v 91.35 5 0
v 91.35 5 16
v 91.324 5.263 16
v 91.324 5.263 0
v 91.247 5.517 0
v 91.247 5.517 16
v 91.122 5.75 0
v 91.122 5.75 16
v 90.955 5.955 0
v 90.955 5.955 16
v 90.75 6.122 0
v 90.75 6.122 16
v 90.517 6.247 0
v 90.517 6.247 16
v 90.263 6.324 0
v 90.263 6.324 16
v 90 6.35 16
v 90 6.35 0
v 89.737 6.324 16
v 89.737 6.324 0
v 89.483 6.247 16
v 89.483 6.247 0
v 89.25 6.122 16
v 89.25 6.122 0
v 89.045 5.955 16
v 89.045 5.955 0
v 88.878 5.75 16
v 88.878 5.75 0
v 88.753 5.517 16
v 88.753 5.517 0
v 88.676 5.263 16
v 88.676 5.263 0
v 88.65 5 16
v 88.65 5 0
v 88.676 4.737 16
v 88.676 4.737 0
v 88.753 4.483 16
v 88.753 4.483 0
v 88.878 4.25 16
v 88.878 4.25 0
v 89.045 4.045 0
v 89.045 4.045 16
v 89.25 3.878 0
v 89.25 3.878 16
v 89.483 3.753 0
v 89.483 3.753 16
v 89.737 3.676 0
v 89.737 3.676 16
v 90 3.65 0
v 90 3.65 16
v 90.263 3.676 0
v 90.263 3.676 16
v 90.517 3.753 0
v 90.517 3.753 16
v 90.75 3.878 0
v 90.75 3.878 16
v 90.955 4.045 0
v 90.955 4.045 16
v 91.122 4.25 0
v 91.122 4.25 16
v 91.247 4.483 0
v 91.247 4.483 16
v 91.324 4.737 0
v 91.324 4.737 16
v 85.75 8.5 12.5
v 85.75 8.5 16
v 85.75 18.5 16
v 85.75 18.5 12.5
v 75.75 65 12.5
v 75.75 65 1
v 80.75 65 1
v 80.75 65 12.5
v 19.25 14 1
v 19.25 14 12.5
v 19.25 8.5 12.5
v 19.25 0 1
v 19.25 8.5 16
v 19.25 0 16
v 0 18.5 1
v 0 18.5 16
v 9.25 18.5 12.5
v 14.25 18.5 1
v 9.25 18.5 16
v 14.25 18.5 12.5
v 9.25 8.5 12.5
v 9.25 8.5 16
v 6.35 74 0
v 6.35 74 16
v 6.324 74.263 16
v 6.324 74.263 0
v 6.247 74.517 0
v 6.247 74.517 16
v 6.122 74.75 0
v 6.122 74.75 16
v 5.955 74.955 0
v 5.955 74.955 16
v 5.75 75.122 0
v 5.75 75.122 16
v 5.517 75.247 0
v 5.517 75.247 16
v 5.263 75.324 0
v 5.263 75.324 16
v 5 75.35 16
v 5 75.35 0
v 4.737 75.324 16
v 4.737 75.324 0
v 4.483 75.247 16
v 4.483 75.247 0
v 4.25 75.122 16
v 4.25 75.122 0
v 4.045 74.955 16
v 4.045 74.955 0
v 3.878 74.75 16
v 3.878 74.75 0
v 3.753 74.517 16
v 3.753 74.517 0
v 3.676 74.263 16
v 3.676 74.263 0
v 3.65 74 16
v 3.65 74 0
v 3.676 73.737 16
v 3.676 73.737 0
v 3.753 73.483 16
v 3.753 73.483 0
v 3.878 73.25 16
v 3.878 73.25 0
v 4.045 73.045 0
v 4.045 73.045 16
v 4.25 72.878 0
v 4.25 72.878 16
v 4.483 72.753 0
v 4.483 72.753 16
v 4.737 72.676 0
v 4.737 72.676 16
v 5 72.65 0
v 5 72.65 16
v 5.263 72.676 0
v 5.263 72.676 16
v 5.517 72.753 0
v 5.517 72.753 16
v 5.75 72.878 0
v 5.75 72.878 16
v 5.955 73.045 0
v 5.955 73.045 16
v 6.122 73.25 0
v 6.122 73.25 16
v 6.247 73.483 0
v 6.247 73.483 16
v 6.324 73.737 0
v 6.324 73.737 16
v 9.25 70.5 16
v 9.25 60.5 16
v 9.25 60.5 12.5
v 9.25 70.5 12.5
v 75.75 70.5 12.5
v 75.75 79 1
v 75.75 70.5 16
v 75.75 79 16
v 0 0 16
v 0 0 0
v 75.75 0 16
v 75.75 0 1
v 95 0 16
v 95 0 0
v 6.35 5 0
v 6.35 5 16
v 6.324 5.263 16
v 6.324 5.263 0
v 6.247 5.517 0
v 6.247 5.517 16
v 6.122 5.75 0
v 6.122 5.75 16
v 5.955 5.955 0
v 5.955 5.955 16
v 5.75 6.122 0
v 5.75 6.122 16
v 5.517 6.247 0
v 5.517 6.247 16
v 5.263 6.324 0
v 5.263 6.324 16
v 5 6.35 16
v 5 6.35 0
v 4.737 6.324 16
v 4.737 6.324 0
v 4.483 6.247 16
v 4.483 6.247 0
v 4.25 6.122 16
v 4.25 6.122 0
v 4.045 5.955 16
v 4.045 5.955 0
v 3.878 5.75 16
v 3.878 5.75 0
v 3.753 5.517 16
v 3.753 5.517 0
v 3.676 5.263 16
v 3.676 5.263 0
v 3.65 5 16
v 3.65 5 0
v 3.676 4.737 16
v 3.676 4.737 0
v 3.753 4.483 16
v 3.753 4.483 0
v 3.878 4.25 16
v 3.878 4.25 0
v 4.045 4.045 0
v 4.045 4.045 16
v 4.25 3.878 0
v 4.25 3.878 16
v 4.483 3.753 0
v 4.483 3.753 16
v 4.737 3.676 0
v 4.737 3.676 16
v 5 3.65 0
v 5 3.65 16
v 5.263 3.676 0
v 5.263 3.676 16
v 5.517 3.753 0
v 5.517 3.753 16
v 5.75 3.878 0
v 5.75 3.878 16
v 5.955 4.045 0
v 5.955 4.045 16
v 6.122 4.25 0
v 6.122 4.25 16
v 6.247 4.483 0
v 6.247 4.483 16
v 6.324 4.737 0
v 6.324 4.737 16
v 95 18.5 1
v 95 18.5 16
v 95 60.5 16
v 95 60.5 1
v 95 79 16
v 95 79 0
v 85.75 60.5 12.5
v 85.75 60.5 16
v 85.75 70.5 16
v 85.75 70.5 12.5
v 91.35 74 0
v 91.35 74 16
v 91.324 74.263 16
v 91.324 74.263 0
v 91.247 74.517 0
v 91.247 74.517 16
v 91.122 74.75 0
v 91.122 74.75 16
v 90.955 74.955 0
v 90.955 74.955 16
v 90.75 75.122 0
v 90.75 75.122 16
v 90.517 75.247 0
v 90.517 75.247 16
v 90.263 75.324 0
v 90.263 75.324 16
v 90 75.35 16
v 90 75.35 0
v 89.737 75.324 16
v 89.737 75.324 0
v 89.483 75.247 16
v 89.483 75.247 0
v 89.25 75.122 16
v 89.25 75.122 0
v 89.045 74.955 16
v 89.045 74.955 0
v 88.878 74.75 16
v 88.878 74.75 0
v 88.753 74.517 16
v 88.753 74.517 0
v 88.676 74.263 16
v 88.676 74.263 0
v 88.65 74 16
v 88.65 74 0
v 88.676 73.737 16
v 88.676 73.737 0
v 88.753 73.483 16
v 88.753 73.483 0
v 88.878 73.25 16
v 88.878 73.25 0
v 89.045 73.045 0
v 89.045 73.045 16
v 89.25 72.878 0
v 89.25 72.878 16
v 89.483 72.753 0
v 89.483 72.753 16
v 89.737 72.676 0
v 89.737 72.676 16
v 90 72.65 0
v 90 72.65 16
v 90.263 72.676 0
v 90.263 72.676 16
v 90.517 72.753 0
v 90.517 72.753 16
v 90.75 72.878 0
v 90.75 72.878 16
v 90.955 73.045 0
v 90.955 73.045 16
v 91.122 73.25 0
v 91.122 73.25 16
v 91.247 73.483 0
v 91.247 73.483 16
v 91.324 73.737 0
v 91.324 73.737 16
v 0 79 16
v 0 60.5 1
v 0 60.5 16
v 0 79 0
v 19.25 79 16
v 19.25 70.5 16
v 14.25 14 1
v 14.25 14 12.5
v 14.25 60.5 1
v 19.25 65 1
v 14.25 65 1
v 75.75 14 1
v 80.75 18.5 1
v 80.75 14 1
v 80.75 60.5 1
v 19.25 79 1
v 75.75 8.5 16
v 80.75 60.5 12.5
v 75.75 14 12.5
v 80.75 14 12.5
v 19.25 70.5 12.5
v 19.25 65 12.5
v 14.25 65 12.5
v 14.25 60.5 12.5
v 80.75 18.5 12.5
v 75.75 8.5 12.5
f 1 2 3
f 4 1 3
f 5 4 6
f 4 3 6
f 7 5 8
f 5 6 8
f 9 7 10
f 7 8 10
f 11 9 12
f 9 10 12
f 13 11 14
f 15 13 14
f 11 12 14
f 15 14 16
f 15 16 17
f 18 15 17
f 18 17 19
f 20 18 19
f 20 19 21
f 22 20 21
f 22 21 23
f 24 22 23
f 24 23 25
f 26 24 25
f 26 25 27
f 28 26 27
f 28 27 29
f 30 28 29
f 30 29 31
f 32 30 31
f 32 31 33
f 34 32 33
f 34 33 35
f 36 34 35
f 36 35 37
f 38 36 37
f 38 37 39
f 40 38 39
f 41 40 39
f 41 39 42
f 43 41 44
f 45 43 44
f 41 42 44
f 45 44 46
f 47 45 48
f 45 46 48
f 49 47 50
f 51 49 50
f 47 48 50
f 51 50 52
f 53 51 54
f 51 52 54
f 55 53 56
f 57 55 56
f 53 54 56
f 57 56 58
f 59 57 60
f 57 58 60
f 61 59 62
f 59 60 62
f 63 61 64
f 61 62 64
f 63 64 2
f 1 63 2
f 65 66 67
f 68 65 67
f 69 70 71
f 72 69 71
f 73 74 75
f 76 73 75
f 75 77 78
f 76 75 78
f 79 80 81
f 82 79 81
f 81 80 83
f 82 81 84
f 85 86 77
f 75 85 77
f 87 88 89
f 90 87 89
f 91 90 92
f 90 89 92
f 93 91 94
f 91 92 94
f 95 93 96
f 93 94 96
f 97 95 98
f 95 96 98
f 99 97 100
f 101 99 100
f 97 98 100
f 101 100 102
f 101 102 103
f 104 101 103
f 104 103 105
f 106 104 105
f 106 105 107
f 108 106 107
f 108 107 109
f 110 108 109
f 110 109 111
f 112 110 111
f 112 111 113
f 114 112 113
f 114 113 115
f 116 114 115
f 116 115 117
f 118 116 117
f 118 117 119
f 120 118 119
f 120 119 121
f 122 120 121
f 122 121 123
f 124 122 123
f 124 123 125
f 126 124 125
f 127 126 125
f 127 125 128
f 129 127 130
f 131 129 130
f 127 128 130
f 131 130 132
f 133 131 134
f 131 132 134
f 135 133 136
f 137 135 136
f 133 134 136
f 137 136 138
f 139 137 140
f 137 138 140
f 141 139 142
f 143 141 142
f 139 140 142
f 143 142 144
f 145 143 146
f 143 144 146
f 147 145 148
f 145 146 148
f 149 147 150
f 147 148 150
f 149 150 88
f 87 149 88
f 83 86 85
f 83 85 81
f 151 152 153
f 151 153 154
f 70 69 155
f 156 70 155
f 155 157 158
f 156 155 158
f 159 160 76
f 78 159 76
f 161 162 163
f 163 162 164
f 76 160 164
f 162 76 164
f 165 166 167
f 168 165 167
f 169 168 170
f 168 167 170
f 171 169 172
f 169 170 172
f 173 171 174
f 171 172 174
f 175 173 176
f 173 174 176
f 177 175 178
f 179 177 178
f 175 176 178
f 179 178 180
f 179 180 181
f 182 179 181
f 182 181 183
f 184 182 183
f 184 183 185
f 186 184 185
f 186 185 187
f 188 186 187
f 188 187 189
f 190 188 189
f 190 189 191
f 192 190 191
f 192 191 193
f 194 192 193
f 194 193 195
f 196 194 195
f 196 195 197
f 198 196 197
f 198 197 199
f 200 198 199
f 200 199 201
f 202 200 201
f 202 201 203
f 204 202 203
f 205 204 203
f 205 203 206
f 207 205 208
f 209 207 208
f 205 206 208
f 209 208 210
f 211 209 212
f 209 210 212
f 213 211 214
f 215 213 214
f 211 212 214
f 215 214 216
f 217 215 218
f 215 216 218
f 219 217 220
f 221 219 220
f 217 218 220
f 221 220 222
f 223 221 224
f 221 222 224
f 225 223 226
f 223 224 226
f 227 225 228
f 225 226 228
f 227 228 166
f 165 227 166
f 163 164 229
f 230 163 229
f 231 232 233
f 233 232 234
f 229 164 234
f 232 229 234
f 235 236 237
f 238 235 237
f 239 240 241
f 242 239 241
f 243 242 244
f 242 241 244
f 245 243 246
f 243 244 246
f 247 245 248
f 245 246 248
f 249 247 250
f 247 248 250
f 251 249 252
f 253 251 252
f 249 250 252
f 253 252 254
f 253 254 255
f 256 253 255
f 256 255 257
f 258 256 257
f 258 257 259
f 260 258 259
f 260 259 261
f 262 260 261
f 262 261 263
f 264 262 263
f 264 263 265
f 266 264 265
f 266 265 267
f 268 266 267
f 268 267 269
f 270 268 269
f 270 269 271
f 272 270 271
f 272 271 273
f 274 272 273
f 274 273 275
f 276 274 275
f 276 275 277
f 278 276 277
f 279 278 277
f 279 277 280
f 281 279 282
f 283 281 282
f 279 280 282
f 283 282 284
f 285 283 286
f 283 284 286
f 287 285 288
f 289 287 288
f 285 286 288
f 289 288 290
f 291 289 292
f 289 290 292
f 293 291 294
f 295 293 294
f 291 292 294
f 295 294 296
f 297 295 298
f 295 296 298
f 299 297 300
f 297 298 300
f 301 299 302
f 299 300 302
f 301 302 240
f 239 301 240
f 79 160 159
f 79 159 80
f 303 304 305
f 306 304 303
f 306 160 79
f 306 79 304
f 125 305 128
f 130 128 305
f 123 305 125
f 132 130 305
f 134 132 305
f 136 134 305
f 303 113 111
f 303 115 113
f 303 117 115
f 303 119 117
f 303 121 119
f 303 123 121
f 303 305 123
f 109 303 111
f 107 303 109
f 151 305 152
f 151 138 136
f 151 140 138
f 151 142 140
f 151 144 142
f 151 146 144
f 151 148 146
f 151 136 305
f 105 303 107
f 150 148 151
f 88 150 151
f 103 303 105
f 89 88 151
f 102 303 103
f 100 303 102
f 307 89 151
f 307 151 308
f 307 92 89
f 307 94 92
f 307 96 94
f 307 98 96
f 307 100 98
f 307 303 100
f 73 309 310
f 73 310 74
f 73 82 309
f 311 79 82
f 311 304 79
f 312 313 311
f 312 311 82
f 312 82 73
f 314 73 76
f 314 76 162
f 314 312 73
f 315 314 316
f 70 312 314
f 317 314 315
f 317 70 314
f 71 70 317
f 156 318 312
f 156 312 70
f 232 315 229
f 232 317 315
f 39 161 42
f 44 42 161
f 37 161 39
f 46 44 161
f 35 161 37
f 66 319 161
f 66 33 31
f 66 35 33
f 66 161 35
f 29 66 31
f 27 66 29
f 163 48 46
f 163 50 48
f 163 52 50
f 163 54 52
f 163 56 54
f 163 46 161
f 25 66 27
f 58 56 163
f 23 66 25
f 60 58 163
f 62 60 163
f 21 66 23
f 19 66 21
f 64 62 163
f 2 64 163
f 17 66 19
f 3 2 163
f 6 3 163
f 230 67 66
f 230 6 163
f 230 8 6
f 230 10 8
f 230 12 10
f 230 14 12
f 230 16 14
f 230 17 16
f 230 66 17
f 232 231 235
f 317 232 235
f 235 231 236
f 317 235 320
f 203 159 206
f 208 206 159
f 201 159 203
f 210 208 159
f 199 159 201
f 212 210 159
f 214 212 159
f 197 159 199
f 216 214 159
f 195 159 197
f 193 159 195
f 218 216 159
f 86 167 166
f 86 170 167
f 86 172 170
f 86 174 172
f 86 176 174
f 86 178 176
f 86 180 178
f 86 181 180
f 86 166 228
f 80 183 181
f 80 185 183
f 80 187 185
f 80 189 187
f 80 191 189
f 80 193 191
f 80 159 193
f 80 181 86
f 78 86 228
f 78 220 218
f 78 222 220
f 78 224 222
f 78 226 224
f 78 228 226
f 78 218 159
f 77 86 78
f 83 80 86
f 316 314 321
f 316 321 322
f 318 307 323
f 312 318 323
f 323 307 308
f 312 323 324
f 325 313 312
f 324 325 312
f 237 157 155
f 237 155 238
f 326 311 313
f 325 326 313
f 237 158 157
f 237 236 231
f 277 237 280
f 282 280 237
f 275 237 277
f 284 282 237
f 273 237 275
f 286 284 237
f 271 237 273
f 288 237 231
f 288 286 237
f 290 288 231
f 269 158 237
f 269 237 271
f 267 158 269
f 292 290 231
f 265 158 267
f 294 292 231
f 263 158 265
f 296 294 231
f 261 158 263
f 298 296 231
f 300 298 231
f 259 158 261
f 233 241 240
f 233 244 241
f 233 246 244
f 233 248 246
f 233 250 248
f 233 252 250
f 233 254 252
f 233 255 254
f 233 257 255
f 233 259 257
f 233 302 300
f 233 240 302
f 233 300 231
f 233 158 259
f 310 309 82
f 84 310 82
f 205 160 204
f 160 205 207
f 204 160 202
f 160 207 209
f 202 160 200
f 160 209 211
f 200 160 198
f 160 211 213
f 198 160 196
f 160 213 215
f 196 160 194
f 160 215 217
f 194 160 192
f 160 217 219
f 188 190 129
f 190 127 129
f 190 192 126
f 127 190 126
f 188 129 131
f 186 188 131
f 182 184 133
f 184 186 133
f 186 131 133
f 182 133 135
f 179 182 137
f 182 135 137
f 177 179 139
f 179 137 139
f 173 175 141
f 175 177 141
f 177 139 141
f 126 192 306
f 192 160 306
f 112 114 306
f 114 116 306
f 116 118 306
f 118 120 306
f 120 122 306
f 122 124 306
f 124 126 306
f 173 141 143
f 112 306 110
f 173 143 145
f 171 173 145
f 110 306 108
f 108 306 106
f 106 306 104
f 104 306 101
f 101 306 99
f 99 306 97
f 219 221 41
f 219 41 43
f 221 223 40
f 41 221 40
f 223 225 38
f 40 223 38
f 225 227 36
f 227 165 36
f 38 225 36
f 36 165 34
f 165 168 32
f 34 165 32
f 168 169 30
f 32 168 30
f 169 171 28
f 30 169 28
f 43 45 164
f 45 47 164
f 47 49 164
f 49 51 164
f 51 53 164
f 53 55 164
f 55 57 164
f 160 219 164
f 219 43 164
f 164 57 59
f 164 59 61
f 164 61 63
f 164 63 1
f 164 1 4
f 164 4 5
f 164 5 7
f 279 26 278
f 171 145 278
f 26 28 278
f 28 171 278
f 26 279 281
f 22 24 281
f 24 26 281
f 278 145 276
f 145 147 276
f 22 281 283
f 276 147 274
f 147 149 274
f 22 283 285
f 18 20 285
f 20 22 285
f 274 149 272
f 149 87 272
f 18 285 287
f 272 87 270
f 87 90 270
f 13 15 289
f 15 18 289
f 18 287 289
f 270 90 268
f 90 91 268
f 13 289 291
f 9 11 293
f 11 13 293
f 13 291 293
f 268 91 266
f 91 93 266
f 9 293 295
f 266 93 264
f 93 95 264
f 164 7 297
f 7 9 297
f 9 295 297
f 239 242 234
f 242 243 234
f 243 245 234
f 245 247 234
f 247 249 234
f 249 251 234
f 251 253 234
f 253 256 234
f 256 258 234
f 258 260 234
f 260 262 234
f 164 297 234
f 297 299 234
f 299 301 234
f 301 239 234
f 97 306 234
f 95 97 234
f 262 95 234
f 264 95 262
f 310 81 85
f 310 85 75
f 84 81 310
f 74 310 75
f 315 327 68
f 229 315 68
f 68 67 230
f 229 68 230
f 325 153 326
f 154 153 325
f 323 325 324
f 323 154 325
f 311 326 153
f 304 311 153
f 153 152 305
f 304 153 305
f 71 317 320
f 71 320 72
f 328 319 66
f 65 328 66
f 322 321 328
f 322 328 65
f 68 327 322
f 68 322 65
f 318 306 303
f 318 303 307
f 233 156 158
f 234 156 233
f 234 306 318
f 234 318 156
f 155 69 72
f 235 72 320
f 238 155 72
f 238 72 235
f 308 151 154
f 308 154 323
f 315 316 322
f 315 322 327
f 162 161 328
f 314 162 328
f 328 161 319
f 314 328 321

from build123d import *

# Parameters (mm, degrees)
F0_W     = 95
F0_H     = 79
F1_DEPTH = 1
F2_W     = 95
F2_H     = 79
F2_W_2   = 66.5
F2_H_2   = 51
F3_DEPTH = 15
F4_W     = 76.5
F4_H     = 62
F4_W_2   = 66.5
F4_H_2   = 51
F5_DEPTH = 3.5
F6_W     = 56.5
F6_H     = 8.5
F6_H_2   = 10
F6_W_2   = 10
F6_H_3   = 42
F6_W_3   = 9.25
F7_DEPTH = 15
F8_R     = 1.35
F9_DEPTH = 16.001


with BuildPart() as f1:
    # F0 (on Top) → F1 (new body)
    with BuildSketch(Plane.XY):
        with Locations((47.5, 39.5)):
            Rectangle(F0_W, F0_H)
    extrude(amount=F1_DEPTH)

    # F2 (on face) → F3 (join)
    with BuildSketch(Plane.XY.offset(1)):
        with Locations((47.5, 39.5)):
            Rectangle(F2_W, F2_H)
        with Locations((47.5, 39.5)):
            Rectangle(F2_W_2, F2_H_2, mode=Mode.SUBTRACT)
    extrude(amount=F3_DEPTH)

    # F4 (on face) → F5 (cut)
    with BuildSketch(Plane.XY.offset(16)):
        with Locations((47.5, 39.5)):
            Rectangle(F4_W, F4_H)
        with Locations((47.5, 39.5)):
            Rectangle(F4_W_2, F4_H_2, mode=Mode.SUBTRACT)
    extrude(amount=-F5_DEPTH, mode=Mode.SUBTRACT)

    # F6 (on face) → F7 (cut, through all)
    with BuildSketch(Plane.XY.offset(16)):
        with Locations((47.5, 74.75)):
            Rectangle(F6_W, F6_H)
        with Locations((47.5, 65.5)):
            Rectangle(F6_W, F6_H_2)
        with Locations((14.25, 39.5)):
            Rectangle(F6_W_2, F6_H_3)
        with Locations((4.625, 39.5)):
            Rectangle(F6_W_3, F6_H_3)
        with Locations((90.375, 39.5)):
            Rectangle(F6_W_3, F6_H_3)
        with Locations((80.75, 39.5)):
            Rectangle(F6_W_2, F6_H_3)
        with Locations((47.5, 4.25)):
            Rectangle(F6_W, F6_H)
        with Locations((47.5, 13.5)):
            Rectangle(F6_W, F6_H_2)
    extrude(amount=-F7_DEPTH, mode=Mode.SUBTRACT)

    # F8 (on face) → F9 (cut, through all)
    with BuildSketch(Plane.XY.offset(16)):
        with Locations((5, 74)):
            Circle(F8_R)
        with Locations((5, 5)):
            Circle(F8_R)
        with Locations((90, 5)):
            Circle(F8_R)
        with Locations((90, 74)):
            Circle(F8_R)
    extrude(amount=-F9_DEPTH, mode=Mode.SUBTRACT)


solid = f1.part
